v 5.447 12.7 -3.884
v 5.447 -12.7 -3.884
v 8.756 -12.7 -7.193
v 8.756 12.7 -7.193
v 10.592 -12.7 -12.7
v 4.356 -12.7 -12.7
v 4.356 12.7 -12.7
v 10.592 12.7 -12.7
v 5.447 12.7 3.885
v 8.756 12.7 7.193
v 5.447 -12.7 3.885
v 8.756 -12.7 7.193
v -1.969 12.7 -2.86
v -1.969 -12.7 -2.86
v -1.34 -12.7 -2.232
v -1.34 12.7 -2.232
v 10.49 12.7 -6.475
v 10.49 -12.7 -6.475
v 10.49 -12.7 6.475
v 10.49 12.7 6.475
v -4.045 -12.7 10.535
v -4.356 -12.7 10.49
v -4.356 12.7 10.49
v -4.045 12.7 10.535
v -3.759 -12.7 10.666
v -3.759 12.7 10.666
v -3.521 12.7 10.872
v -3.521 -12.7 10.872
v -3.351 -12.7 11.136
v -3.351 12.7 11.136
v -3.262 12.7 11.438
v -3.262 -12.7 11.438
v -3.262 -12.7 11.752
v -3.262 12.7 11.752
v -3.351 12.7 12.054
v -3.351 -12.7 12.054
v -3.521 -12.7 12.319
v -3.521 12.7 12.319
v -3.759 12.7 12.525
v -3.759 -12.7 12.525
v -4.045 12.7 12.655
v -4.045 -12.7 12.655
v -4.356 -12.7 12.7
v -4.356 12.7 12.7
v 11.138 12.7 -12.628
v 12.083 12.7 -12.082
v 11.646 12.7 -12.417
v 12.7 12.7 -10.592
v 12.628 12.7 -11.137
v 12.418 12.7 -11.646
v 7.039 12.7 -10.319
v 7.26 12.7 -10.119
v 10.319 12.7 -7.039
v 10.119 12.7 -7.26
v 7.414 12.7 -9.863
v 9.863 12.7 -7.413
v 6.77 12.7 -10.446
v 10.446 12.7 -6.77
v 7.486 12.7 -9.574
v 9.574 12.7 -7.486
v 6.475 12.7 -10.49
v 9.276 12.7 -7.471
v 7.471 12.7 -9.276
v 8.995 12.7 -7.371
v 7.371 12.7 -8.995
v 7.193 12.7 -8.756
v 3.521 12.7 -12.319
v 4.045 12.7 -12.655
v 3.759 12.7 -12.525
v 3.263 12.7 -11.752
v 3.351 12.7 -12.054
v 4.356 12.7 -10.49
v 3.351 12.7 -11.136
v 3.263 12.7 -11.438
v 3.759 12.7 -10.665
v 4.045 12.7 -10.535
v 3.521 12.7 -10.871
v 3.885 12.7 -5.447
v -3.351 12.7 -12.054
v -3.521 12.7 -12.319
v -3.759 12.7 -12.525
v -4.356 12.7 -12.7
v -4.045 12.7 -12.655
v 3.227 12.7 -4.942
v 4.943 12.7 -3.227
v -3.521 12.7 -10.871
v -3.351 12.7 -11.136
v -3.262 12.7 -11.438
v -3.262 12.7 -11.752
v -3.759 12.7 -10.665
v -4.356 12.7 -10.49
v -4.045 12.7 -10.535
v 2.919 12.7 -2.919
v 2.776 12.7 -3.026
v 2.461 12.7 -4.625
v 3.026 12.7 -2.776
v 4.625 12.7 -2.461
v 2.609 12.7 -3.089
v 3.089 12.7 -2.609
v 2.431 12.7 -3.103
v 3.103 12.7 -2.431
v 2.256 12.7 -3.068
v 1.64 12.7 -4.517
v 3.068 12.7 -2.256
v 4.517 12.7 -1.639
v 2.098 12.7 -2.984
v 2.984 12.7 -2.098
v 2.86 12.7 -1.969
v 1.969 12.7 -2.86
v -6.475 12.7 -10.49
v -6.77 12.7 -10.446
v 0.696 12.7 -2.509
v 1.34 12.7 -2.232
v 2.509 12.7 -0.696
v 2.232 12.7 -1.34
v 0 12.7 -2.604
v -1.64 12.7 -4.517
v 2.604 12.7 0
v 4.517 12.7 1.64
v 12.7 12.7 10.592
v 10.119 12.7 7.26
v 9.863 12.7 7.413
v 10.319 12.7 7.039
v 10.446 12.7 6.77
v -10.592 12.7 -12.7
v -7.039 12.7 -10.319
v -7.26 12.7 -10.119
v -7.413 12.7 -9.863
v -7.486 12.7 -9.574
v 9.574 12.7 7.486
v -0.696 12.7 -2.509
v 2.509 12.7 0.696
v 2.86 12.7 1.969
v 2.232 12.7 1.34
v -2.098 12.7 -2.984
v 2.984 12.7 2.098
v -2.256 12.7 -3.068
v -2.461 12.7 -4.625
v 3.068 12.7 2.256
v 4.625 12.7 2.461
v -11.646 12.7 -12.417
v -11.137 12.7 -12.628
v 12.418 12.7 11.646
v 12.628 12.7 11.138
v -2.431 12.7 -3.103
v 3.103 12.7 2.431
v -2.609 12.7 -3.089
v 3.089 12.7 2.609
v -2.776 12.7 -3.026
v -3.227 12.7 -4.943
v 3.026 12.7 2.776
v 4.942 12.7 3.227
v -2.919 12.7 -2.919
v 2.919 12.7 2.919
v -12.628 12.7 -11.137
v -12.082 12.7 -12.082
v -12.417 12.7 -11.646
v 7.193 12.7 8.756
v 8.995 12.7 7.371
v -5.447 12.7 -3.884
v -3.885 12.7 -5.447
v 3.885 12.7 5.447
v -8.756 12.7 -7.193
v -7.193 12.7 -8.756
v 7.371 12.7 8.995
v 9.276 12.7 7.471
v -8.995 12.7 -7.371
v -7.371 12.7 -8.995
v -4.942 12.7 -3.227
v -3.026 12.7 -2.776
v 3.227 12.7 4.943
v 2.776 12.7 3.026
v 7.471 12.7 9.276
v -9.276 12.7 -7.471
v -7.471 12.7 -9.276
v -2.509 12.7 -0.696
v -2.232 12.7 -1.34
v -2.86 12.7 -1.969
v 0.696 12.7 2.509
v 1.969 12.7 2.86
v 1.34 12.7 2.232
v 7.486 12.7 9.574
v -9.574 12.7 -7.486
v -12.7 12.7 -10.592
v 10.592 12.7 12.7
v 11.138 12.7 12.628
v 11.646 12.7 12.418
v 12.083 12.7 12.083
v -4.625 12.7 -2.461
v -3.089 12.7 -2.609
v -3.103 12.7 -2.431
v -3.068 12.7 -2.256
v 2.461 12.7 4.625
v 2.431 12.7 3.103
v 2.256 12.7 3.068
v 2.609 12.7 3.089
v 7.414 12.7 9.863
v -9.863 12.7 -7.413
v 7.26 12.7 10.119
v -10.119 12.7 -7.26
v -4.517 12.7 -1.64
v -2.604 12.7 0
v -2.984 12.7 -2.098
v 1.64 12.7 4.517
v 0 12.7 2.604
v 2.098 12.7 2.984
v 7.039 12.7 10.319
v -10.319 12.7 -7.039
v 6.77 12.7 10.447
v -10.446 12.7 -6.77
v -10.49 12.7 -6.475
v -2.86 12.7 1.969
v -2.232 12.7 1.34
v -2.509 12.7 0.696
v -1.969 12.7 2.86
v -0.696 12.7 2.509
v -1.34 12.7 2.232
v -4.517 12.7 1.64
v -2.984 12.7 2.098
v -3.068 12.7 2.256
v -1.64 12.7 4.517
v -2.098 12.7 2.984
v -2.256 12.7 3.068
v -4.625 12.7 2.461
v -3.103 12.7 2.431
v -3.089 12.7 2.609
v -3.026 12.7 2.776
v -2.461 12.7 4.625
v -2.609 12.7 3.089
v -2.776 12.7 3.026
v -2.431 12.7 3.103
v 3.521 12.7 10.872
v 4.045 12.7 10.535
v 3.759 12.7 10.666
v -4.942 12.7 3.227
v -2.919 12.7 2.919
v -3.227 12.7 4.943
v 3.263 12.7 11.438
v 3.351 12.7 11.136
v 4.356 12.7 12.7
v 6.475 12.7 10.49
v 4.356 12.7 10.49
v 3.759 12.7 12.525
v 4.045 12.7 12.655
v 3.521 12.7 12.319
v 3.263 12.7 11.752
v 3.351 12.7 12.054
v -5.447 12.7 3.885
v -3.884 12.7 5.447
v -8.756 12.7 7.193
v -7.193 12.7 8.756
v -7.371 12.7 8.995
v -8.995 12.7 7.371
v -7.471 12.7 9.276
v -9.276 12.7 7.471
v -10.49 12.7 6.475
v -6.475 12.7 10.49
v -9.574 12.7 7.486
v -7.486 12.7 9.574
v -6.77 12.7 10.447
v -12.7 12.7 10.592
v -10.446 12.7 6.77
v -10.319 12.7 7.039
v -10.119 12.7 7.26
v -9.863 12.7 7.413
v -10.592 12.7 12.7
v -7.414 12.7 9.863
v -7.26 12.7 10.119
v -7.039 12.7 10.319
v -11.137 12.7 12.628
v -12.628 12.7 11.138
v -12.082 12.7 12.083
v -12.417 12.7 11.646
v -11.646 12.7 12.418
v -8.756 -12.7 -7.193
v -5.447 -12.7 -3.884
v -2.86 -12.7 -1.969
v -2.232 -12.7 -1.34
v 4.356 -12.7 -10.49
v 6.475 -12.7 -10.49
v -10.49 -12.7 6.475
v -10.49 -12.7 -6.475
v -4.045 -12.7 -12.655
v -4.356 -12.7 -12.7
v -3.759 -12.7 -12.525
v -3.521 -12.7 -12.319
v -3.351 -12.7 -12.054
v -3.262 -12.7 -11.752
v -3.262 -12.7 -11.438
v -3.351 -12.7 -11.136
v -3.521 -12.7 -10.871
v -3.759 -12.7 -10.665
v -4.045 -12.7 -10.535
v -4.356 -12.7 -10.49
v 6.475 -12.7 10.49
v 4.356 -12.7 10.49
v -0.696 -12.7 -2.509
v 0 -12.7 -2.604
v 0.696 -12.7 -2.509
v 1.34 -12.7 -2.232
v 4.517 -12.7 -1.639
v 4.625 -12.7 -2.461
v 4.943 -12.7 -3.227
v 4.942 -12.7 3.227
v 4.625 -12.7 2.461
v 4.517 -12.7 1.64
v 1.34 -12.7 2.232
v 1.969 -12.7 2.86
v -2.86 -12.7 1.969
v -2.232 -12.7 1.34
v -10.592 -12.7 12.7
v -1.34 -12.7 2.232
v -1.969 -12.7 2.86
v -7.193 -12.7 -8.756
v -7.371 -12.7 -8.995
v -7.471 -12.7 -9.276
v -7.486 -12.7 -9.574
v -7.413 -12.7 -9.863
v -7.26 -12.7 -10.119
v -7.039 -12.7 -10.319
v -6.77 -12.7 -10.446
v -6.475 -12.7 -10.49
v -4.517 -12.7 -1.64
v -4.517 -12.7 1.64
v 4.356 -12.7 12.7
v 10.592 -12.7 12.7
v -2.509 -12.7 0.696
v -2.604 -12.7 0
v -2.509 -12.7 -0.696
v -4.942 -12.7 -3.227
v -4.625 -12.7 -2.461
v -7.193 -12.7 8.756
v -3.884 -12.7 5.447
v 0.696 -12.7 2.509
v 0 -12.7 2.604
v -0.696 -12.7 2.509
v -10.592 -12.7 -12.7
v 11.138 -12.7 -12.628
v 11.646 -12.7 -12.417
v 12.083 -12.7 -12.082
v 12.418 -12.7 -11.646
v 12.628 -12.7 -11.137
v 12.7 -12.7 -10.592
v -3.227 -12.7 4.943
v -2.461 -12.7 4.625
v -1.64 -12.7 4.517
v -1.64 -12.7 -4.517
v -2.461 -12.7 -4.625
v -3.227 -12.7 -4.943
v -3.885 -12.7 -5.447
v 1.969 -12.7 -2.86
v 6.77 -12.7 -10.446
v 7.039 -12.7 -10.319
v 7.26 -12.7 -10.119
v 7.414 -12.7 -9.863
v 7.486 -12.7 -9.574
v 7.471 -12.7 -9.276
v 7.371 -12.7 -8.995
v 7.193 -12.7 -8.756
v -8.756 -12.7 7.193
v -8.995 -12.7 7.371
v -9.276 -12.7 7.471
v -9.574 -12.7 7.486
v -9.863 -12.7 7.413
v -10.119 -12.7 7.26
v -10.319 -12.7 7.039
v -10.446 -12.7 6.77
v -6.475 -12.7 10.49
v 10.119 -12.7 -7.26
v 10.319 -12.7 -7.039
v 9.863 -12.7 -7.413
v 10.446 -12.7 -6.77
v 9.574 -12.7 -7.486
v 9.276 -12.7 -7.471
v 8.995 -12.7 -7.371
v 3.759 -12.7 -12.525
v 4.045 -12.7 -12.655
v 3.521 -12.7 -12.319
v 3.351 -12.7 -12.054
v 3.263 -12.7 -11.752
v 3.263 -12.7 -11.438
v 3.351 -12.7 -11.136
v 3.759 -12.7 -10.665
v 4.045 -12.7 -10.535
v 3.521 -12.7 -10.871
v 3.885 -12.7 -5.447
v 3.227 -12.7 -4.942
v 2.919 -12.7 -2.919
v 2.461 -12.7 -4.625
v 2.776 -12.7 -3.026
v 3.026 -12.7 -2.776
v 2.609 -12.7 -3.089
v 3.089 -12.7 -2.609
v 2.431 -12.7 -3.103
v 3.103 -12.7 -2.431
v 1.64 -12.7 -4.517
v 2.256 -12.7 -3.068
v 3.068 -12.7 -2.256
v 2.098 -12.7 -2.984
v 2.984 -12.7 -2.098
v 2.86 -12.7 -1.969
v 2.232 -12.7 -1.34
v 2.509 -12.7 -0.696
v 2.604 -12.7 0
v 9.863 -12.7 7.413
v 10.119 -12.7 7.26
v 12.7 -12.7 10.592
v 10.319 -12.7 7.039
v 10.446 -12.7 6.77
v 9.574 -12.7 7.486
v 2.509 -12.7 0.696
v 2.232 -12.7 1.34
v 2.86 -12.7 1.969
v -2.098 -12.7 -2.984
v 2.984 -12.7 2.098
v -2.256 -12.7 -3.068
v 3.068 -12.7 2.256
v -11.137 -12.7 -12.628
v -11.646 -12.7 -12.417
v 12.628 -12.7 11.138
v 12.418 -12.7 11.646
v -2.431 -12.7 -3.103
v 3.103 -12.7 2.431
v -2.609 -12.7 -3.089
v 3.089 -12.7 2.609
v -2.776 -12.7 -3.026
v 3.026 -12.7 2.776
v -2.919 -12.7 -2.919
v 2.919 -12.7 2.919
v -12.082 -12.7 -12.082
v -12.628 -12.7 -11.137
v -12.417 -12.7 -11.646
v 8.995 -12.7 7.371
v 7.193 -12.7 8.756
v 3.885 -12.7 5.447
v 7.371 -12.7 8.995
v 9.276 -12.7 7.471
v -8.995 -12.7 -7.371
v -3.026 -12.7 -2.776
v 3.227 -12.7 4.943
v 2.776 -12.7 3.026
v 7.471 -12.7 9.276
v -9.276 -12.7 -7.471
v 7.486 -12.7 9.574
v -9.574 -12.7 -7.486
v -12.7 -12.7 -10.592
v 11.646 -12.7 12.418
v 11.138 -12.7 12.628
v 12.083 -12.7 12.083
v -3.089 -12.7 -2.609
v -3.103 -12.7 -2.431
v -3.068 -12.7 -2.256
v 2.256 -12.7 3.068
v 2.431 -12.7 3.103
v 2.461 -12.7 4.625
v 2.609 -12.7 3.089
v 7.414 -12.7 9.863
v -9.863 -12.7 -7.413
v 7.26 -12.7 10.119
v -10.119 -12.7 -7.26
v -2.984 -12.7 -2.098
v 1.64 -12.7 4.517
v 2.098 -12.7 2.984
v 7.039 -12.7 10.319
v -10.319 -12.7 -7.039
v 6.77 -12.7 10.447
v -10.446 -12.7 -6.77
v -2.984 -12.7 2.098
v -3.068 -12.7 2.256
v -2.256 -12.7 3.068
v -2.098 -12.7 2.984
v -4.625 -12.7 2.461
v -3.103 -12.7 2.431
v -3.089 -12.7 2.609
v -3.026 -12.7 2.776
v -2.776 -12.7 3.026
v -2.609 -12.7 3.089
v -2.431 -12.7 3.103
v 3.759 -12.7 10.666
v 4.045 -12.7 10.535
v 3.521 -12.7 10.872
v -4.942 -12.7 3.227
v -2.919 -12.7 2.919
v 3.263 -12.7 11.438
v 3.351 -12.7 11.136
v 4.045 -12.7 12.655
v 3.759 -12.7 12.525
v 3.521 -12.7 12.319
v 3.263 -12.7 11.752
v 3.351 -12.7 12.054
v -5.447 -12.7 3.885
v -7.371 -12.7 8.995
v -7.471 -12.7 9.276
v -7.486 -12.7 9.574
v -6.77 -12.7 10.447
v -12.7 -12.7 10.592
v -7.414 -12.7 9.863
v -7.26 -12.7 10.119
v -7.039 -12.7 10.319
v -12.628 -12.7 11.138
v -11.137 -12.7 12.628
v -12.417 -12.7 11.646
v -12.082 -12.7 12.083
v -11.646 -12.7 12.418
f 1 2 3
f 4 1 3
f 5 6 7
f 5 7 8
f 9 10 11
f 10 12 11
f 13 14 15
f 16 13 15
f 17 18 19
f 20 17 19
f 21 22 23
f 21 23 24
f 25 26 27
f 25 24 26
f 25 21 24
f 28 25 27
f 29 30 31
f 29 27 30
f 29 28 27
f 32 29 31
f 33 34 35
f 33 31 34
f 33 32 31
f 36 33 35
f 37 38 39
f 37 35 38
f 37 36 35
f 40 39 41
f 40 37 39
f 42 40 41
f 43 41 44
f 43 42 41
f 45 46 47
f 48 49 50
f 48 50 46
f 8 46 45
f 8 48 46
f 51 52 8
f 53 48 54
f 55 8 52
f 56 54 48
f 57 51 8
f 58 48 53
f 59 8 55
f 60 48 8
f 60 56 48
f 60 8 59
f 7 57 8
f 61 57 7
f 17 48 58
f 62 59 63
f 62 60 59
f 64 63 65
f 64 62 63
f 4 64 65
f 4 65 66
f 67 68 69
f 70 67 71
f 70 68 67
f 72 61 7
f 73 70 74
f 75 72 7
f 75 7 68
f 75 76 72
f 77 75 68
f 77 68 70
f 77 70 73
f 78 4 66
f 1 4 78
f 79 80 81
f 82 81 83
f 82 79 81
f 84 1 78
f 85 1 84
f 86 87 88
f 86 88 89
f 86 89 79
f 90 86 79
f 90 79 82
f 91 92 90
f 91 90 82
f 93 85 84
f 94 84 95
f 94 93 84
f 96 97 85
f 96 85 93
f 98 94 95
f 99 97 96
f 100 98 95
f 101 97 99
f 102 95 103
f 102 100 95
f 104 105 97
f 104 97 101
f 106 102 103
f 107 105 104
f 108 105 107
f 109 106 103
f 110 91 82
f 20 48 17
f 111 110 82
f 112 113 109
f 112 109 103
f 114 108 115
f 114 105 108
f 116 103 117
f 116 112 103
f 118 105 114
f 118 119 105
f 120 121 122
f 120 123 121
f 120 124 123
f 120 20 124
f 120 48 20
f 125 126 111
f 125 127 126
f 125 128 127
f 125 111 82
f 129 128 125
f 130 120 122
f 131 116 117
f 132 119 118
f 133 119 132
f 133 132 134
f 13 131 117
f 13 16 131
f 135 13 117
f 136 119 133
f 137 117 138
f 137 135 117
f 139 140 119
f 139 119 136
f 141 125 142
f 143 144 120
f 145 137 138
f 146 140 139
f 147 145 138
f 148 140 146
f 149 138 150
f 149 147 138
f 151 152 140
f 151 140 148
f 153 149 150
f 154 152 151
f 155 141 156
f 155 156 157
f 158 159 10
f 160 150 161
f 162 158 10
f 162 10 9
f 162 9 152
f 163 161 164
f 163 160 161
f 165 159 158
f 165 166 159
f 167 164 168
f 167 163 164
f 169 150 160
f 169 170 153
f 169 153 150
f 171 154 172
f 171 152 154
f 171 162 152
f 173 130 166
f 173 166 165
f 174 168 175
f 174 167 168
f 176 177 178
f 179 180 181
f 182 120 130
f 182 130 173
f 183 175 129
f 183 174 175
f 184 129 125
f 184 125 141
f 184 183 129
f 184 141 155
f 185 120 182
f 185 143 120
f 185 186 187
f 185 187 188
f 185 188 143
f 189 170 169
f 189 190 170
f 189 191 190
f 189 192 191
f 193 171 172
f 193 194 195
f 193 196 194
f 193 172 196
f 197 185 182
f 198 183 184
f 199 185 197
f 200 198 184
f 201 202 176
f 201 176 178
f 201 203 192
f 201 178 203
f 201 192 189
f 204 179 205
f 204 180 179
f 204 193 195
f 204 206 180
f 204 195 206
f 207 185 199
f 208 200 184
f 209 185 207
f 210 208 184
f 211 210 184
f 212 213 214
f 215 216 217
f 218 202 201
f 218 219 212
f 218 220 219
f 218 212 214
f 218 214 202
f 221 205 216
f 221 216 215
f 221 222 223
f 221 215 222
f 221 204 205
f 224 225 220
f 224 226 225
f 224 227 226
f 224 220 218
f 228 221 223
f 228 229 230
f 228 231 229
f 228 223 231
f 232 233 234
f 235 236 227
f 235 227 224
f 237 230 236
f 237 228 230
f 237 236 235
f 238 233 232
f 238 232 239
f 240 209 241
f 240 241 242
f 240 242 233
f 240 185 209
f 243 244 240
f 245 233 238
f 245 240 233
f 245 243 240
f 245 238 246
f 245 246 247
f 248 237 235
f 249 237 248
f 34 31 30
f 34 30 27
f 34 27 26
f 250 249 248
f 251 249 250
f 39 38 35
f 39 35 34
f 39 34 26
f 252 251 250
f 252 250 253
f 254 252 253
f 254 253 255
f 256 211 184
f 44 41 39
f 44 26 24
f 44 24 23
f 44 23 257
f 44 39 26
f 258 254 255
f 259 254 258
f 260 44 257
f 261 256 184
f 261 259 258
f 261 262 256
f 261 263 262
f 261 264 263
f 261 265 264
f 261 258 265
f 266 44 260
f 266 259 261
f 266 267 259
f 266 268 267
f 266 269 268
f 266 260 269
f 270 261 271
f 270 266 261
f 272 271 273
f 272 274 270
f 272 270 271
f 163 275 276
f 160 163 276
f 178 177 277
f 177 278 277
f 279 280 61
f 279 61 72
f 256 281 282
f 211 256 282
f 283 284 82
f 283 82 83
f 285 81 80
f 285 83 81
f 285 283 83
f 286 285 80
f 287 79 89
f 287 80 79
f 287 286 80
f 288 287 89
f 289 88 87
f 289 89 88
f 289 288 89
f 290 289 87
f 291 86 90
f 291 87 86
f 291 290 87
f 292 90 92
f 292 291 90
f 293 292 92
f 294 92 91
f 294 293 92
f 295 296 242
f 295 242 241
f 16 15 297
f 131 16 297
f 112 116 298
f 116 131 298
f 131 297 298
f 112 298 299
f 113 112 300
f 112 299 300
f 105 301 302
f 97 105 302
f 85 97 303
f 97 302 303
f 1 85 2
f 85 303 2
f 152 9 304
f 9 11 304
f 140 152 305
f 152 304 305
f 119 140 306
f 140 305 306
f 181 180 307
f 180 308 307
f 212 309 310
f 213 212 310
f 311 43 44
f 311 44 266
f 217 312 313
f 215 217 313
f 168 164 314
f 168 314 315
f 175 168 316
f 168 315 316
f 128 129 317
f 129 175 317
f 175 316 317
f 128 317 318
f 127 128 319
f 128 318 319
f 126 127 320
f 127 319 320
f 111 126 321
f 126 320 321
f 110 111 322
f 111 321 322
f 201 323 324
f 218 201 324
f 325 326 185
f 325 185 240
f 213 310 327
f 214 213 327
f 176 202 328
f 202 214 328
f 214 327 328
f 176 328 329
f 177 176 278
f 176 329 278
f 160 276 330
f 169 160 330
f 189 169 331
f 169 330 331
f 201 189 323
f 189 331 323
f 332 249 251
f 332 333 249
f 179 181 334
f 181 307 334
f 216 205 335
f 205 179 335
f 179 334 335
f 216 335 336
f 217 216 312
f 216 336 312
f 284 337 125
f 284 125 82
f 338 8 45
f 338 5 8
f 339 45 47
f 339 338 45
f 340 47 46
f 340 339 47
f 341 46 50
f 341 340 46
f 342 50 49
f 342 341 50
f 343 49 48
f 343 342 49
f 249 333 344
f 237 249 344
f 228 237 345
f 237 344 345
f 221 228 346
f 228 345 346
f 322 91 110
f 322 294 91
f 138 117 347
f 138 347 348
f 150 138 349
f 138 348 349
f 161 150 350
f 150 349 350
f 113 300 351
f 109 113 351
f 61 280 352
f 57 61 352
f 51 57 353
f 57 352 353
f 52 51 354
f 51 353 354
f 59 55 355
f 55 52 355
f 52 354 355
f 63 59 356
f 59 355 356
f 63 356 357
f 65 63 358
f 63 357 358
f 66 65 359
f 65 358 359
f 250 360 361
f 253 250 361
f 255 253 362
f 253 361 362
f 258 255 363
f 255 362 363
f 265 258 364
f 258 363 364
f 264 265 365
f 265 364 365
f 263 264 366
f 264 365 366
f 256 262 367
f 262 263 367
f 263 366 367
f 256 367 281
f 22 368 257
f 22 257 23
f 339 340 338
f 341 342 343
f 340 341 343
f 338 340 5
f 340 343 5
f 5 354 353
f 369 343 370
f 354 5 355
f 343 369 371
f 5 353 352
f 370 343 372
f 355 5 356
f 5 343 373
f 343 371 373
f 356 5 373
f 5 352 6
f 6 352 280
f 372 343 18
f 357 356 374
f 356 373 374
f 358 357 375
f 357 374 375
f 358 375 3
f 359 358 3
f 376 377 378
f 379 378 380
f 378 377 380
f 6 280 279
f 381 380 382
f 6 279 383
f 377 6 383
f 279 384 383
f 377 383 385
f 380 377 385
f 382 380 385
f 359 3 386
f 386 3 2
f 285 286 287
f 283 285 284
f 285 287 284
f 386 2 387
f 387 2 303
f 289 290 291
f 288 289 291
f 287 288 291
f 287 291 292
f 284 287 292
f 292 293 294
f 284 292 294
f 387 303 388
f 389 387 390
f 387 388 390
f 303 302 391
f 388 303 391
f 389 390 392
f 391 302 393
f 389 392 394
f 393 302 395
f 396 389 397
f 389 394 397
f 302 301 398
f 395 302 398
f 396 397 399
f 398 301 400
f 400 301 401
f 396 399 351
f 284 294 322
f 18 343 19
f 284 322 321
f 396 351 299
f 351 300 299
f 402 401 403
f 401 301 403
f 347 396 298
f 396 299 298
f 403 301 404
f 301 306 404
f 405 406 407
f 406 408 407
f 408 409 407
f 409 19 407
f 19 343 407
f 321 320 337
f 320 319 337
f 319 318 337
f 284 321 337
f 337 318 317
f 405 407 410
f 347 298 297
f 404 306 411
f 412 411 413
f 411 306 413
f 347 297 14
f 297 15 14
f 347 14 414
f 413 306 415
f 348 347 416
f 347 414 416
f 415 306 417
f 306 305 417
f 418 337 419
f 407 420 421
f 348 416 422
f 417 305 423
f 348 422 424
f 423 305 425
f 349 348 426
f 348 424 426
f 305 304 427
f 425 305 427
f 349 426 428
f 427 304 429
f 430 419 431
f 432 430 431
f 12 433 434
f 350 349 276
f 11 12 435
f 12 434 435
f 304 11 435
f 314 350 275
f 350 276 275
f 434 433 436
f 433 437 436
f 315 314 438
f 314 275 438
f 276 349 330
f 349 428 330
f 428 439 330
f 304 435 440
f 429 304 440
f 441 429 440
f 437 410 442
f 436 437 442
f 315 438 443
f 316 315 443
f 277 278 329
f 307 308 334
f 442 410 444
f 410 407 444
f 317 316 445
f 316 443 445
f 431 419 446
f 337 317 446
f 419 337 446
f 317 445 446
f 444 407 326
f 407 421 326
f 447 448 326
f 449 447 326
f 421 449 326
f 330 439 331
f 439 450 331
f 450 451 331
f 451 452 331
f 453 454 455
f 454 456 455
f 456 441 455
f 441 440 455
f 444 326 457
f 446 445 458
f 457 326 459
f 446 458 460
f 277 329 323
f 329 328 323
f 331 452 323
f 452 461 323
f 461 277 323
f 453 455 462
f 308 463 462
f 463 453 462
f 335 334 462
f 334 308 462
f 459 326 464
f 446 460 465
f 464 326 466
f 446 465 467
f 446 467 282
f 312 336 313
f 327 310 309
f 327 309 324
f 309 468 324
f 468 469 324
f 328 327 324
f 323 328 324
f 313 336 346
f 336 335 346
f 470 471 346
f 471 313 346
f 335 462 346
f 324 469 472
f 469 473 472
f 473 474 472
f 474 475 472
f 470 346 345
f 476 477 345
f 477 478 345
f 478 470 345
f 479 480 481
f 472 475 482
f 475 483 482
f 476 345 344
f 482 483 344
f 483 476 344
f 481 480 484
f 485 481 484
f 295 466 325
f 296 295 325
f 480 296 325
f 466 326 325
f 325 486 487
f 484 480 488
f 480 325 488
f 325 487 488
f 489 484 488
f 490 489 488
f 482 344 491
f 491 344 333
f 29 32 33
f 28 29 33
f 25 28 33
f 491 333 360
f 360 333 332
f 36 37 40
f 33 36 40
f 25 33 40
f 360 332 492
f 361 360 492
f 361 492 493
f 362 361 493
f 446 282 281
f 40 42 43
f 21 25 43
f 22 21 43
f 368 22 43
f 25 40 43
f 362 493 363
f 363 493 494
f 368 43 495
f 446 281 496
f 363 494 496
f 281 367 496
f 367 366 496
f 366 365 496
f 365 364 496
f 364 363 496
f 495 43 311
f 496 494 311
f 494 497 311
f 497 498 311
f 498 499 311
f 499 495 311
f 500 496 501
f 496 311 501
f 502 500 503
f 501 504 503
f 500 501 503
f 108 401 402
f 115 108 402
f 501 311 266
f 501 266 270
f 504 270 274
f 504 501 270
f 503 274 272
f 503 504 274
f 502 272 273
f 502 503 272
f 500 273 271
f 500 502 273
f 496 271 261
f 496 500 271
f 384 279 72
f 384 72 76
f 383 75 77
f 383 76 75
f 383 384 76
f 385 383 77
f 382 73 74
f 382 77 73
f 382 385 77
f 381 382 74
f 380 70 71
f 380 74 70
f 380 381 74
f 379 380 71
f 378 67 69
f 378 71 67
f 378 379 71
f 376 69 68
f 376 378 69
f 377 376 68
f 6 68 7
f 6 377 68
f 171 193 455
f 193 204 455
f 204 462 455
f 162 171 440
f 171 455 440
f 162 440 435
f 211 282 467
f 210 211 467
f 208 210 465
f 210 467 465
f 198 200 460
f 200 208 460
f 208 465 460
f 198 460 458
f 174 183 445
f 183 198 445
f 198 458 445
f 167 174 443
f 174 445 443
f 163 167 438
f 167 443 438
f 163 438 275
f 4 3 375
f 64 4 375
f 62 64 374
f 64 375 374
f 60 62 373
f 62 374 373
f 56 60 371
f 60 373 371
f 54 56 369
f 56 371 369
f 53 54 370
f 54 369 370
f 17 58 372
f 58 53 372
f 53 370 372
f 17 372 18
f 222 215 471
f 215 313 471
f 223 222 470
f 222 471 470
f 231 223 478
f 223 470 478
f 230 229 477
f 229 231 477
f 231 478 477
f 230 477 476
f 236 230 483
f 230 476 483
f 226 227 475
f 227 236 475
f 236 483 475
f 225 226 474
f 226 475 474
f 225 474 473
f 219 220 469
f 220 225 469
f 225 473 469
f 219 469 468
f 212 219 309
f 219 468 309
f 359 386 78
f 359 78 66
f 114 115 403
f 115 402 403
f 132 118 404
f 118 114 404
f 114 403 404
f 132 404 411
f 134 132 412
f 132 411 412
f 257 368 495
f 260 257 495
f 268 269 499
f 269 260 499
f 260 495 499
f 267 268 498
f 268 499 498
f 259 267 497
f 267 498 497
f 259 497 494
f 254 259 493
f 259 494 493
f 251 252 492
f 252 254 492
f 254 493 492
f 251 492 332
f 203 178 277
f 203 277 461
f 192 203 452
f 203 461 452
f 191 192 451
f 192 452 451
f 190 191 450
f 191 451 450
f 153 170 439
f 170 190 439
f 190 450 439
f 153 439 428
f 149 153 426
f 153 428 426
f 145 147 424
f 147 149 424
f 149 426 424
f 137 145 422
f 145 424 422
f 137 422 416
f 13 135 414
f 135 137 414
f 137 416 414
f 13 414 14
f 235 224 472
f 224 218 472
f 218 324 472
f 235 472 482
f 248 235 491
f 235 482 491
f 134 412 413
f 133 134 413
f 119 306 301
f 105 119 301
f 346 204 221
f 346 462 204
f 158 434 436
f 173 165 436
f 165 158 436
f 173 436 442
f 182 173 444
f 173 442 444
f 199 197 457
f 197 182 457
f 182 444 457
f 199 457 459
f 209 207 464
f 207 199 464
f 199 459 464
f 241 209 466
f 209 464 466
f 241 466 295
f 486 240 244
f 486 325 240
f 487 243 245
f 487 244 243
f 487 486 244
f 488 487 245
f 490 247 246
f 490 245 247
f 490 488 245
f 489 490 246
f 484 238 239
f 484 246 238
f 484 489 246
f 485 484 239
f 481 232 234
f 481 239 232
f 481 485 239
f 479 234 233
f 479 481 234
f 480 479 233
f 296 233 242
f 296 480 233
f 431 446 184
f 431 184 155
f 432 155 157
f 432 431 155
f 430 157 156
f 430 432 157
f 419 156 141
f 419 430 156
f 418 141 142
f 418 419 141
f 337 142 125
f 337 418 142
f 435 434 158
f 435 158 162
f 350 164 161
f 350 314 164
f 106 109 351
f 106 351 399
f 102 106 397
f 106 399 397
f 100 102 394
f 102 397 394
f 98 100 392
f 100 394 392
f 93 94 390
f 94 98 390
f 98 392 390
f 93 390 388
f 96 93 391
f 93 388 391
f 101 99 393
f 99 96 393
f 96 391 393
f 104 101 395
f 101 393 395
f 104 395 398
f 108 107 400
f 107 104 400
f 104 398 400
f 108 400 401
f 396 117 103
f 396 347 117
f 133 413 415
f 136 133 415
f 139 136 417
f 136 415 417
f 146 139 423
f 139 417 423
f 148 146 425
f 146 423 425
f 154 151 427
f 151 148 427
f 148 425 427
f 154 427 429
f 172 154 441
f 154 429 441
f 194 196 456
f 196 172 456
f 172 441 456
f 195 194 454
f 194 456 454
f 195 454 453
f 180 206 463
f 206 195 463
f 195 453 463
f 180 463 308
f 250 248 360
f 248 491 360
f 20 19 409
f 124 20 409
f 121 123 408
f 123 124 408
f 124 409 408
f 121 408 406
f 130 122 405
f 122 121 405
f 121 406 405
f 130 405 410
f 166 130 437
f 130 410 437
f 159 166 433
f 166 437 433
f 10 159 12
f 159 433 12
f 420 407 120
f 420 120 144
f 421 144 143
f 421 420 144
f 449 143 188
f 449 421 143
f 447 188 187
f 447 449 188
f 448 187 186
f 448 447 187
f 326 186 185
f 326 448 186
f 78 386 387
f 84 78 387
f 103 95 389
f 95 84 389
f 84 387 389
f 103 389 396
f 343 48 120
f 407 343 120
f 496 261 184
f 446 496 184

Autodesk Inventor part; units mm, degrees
ref_plane "YZ Plane" through (0, 0, 0) normal (1, 0, 0) x (0, 1, 0)
ref_plane "XZ Plane" through (0, 0, 0) normal (0, 1, 0) x (-1, 0, 0)
ref_plane "XY Plane" through (0, 0, 0) normal (0, 0, 1) x (1, 0, 0)
sketch "Sketch1" plane through (0, 0, 0) normal (0, 1, 0) x (-1, 0, 0)
  arc A0 (-2.8605, -1.9692) -> (-1.9692, -2.8605) centre (-2.4696, -2.4696) ccw
  line L0 (-1.3405, -2.2319) -> (-1.9692, -2.8605)
  arc A1 (-1.3405, -2.2319) -> (1.3405, -2.2319) centre (0, 0) ccw
  line L1 (1.9692, -2.8605) -> (1.3405, -2.2319)
  arc A2 (1.9692, -2.8605) -> (2.8605, -1.9692) centre (2.4696, -2.4696) ccw
  line L2 (2.2319, -1.3405) -> (2.8605, -1.9692)
  arc A3 (2.2319, -1.3405) -> (2.2319, 1.3405) centre (0, 0) ccw
  line L3 (2.8605, 1.9692) -> (2.2319, 1.3405)
  arc A4 (2.8605, 1.9692) -> (1.9692, 2.8605) centre (2.4696, 2.4696) ccw
  line L4 (1.3405, 2.2319) -> (1.9692, 2.8605)
  arc A5 (1.3405, 2.2319) -> (-1.3405, 2.2319) centre (0, 0) ccw
  line L5 (-1.9692, 2.8605) -> (-1.3405, 2.2319)
  arc A6 (-1.9692, 2.8605) -> (-2.8605, 1.9692) centre (-2.4696, 2.4696) ccw
  line L6 (-2.2319, 1.3405) -> (-2.8605, 1.9692)
  arc A7 (-2.2319, 1.3405) -> (-2.2319, -1.3405) centre (0, 0) ccw
  line L7 (-2.8605, -1.9692) -> (-2.2319, -1.3405)
  arc A8 (4.5171, -1.6395) -> (5.447, -3.8845) centre (7.6921, -1.6395) ccw
  line L8 (8.7557, -7.1932) -> (5.447, -3.8845)
  arc A9 (8.7557, -7.1932) -> (10.4901, -6.4748) centre (9.4741, -6.4748) ccw
  line L9 (10.4901, 6.4748) -> (10.4901, -6.4748)
  arc A10 (10.4901, 6.4748) -> (8.7557, 7.1933) centre (9.4741, 6.4748) ccw
  line L10 (5.447, 3.8846) -> (8.7557, 7.1933)
  arc A11 (5.447, 3.8846) -> (4.5171, 1.6395) centre (7.6921, 1.6395) ccw
  line L11 (4.5171, -1.6395) -> (4.5171, 1.6395)
  arc A12 (-8.7557, 7.1933) -> (-10.4901, 6.4748) centre (-9.4741, 6.4748) ccw
  line L12 (-10.4901, -6.4747) -> (-10.4901, 6.4748)
  arc A13 (-10.4901, -6.4747) -> (-8.7557, -7.1932) centre (-9.4741, -6.4747) ccw
  line L13 (-5.4471, -3.8845) -> (-8.7557, -7.1932)
  arc A14 (-5.4471, -3.8845) -> (-4.5171, -1.6394) centre (-7.6921, -1.6394) ccw
  line L14 (-4.5171, 1.6395) -> (-4.5171, -1.6394)
  arc A15 (-4.5171, 1.6395) -> (-5.4471, 3.8846) centre (-7.6921, 1.6395) ccw
  line L15 (-8.7557, 7.1933) -> (-5.4471, 3.8846)
  arc A16 (10.5917, -12.6999) -> (12.6999, -10.5917) centre (10.5917, -10.5917) ccw
  line L16 (10.5917, -12.6999) -> (4.356, -12.6999)
  arc A17 (4.356, -10.4901) -> (4.356, -12.6999) centre (4.356, -11.595) ccw
  line L17 (4.356, -10.4901) -> (6.4748, -10.4901)
  arc A18 (6.4748, -10.4901) -> (7.1933, -8.7557) centre (6.4748, -9.4741) ccw
  line L18 (7.1933, -8.7557) -> (3.8846, -5.4471)
  arc A19 (3.8846, -5.4471) -> (1.6395, -4.5171) centre (1.6395, -7.6921) ccw
  line L19 (1.6395, -4.5171) -> (-1.6396, -4.5171)
  arc A20 (-1.6396, -4.5171) -> (-3.8847, -5.4471) centre (-1.6396, -7.6921) ccw
  line L20 (-3.8847, -5.4471) -> (-7.1933, -8.7557)
  arc A21 (-7.1933, -8.7557) -> (-6.4749, -10.4901) centre (-6.4749, -9.4741) ccw
  line L21 (-6.4749, -10.4901) -> (-4.3562, -10.4901)
  arc A22 (-4.3562, -12.6999) -> (-4.3562, -10.4901) centre (-4.3562, -11.595) ccw
  line L22 (-4.3562, -12.6999) -> (-10.5919, -12.6999)
  arc A23 (-12.7001, -10.5917) -> (-10.5919, -12.6999) centre (-10.5919, -10.5917) ccw
  line L23 (-12.7001, -10.5917) -> (-12.7001, 10.5919)
  arc A24 (-10.5919, 12.7001) -> (-12.7001, 10.5919) centre (-10.5919, 10.5919) ccw
  line L24 (-10.5919, 12.7001) -> (-4.3562, 12.7001)
  arc A25 (-4.3562, 10.4903) -> (-4.3562, 12.7001) centre (-4.3562, 11.5952) ccw
  line L25 (-4.3562, 10.4903) -> (-6.475, 10.4903)
  arc A26 (-6.475, 10.4903) -> (-7.1934, 8.7558) centre (-6.475, 9.4743) ccw
  line L26 (-7.1934, 8.7558) -> (-3.8846, 5.4471)
  arc A27 (-3.8846, 5.4471) -> (-1.6396, 4.5172) centre (-1.6396, 7.6922) ccw
  line L27 (-1.6396, 4.5172) -> (1.6395, 4.5172)
  arc A28 (1.6395, 4.5172) -> (3.8845, 5.4471) centre (1.6395, 7.6922) ccw
  line L28 (3.8845, 5.4471) -> (7.1933, 8.7558)
  arc A29 (7.1933, 8.7558) -> (6.4748, 10.4903) centre (6.4748, 9.4743) ccw
  line L29 (6.4748, 10.4903) -> (4.356, 10.4903)
  arc A30 (4.356, 12.7001) -> (4.356, 10.4903) centre (4.356, 11.5952) ccw
  line L30 (4.356, 12.7001) -> (10.5917, 12.7001)
  arc A31 (12.6999, 10.5919) -> (10.5917, 12.7001) centre (10.5917, 10.5919) ccw
  line L31 (12.6999, 10.5919) -> (12.6999, -10.5917)
  point P0 (0, 0)
  dimension "d0" = 2.1082
  dimension "d1" = 1.016
  dimension "d2" = 3.175
  dimension "d3" = 1.1049
  dimension "d4" = 0.635
  dimension "d5" = 2.6035
  dimension "d6" = 2.6035
  dimension "d7" = 2.6035
  dimension "d8" = 2.6035
  dimension "d9" = 90
  dimension "d10" = 90
  dimension "d11" = 45
  dimension "d12" = 45
  dimension "d13" = 45
  dimension "d14" = 90
  dimension "d15" = 90
  dimension "d16" = 45
  dimension "d17" = 45
  dimension "d18" = 45
  dimension "d19" = 45
  dimension "d20" = 45
  dimension "d21" = 45
  dimension "d22" = 2.2099
  dimension "d23" = 8.1829
  dimension "d24" = 17.2171
  dimension "d25" = 23.1901
  dimension "d26" = 25.4
  dimension "d27" = 1.7352
  dimension "d28" = 0.4746
  dimension "d29" = 2.2097
  dimension "d30" = 1.7351
  dimension "d31" = 0.4746
  dimension "d32" = 2.2096
  dimension "d33" = 9.0343
  dimension "d34" = 5.9731
  dimension "d35" = 15.0073
  dimension "d36" = 12.6999
  dimension "d37" = 12.7
  dimension "d38" = 12.6999
  dimension "d39" = 1.1048
  dimension "d40" = 1.1048
  dimension "d41" = 1.1049
  dimension "d42" = 1.1048
  dimension "d43" = 10.4902
  dimension "d44" = 10.4901
  dimension "d45" = 4.5172
  dimension "d46" = 0.6303
  dimension "d47" = 0.6303
  dimension "d48" = 0.6303
  dimension "d49" = 0.6303
  dimension "d50" = 1.1048
  dimension "d51" = 1.1049
  dimension "d52" = 8.3439
  dimension "d53" = 8.3439
  dimension "d54" = 9.8395
  dimension "d55" = 9.8395
  dimension "d56" = 10.2304
  dimension "d57" = 10.2304
  dimension "d58" = 10.4681
  dimension "d59" = 10.4681
  dimension "d60" = 14.6691
  dimension "d61" = 14.6691
  dimension "d62" = 15.1695
  dimension "d63" = 15.1695
extrude "Extrusion1" add sketch "Sketch1" along normal mid plane 25.4
properties part number "1004-S-BLACK-FB" material "6105-T5"
